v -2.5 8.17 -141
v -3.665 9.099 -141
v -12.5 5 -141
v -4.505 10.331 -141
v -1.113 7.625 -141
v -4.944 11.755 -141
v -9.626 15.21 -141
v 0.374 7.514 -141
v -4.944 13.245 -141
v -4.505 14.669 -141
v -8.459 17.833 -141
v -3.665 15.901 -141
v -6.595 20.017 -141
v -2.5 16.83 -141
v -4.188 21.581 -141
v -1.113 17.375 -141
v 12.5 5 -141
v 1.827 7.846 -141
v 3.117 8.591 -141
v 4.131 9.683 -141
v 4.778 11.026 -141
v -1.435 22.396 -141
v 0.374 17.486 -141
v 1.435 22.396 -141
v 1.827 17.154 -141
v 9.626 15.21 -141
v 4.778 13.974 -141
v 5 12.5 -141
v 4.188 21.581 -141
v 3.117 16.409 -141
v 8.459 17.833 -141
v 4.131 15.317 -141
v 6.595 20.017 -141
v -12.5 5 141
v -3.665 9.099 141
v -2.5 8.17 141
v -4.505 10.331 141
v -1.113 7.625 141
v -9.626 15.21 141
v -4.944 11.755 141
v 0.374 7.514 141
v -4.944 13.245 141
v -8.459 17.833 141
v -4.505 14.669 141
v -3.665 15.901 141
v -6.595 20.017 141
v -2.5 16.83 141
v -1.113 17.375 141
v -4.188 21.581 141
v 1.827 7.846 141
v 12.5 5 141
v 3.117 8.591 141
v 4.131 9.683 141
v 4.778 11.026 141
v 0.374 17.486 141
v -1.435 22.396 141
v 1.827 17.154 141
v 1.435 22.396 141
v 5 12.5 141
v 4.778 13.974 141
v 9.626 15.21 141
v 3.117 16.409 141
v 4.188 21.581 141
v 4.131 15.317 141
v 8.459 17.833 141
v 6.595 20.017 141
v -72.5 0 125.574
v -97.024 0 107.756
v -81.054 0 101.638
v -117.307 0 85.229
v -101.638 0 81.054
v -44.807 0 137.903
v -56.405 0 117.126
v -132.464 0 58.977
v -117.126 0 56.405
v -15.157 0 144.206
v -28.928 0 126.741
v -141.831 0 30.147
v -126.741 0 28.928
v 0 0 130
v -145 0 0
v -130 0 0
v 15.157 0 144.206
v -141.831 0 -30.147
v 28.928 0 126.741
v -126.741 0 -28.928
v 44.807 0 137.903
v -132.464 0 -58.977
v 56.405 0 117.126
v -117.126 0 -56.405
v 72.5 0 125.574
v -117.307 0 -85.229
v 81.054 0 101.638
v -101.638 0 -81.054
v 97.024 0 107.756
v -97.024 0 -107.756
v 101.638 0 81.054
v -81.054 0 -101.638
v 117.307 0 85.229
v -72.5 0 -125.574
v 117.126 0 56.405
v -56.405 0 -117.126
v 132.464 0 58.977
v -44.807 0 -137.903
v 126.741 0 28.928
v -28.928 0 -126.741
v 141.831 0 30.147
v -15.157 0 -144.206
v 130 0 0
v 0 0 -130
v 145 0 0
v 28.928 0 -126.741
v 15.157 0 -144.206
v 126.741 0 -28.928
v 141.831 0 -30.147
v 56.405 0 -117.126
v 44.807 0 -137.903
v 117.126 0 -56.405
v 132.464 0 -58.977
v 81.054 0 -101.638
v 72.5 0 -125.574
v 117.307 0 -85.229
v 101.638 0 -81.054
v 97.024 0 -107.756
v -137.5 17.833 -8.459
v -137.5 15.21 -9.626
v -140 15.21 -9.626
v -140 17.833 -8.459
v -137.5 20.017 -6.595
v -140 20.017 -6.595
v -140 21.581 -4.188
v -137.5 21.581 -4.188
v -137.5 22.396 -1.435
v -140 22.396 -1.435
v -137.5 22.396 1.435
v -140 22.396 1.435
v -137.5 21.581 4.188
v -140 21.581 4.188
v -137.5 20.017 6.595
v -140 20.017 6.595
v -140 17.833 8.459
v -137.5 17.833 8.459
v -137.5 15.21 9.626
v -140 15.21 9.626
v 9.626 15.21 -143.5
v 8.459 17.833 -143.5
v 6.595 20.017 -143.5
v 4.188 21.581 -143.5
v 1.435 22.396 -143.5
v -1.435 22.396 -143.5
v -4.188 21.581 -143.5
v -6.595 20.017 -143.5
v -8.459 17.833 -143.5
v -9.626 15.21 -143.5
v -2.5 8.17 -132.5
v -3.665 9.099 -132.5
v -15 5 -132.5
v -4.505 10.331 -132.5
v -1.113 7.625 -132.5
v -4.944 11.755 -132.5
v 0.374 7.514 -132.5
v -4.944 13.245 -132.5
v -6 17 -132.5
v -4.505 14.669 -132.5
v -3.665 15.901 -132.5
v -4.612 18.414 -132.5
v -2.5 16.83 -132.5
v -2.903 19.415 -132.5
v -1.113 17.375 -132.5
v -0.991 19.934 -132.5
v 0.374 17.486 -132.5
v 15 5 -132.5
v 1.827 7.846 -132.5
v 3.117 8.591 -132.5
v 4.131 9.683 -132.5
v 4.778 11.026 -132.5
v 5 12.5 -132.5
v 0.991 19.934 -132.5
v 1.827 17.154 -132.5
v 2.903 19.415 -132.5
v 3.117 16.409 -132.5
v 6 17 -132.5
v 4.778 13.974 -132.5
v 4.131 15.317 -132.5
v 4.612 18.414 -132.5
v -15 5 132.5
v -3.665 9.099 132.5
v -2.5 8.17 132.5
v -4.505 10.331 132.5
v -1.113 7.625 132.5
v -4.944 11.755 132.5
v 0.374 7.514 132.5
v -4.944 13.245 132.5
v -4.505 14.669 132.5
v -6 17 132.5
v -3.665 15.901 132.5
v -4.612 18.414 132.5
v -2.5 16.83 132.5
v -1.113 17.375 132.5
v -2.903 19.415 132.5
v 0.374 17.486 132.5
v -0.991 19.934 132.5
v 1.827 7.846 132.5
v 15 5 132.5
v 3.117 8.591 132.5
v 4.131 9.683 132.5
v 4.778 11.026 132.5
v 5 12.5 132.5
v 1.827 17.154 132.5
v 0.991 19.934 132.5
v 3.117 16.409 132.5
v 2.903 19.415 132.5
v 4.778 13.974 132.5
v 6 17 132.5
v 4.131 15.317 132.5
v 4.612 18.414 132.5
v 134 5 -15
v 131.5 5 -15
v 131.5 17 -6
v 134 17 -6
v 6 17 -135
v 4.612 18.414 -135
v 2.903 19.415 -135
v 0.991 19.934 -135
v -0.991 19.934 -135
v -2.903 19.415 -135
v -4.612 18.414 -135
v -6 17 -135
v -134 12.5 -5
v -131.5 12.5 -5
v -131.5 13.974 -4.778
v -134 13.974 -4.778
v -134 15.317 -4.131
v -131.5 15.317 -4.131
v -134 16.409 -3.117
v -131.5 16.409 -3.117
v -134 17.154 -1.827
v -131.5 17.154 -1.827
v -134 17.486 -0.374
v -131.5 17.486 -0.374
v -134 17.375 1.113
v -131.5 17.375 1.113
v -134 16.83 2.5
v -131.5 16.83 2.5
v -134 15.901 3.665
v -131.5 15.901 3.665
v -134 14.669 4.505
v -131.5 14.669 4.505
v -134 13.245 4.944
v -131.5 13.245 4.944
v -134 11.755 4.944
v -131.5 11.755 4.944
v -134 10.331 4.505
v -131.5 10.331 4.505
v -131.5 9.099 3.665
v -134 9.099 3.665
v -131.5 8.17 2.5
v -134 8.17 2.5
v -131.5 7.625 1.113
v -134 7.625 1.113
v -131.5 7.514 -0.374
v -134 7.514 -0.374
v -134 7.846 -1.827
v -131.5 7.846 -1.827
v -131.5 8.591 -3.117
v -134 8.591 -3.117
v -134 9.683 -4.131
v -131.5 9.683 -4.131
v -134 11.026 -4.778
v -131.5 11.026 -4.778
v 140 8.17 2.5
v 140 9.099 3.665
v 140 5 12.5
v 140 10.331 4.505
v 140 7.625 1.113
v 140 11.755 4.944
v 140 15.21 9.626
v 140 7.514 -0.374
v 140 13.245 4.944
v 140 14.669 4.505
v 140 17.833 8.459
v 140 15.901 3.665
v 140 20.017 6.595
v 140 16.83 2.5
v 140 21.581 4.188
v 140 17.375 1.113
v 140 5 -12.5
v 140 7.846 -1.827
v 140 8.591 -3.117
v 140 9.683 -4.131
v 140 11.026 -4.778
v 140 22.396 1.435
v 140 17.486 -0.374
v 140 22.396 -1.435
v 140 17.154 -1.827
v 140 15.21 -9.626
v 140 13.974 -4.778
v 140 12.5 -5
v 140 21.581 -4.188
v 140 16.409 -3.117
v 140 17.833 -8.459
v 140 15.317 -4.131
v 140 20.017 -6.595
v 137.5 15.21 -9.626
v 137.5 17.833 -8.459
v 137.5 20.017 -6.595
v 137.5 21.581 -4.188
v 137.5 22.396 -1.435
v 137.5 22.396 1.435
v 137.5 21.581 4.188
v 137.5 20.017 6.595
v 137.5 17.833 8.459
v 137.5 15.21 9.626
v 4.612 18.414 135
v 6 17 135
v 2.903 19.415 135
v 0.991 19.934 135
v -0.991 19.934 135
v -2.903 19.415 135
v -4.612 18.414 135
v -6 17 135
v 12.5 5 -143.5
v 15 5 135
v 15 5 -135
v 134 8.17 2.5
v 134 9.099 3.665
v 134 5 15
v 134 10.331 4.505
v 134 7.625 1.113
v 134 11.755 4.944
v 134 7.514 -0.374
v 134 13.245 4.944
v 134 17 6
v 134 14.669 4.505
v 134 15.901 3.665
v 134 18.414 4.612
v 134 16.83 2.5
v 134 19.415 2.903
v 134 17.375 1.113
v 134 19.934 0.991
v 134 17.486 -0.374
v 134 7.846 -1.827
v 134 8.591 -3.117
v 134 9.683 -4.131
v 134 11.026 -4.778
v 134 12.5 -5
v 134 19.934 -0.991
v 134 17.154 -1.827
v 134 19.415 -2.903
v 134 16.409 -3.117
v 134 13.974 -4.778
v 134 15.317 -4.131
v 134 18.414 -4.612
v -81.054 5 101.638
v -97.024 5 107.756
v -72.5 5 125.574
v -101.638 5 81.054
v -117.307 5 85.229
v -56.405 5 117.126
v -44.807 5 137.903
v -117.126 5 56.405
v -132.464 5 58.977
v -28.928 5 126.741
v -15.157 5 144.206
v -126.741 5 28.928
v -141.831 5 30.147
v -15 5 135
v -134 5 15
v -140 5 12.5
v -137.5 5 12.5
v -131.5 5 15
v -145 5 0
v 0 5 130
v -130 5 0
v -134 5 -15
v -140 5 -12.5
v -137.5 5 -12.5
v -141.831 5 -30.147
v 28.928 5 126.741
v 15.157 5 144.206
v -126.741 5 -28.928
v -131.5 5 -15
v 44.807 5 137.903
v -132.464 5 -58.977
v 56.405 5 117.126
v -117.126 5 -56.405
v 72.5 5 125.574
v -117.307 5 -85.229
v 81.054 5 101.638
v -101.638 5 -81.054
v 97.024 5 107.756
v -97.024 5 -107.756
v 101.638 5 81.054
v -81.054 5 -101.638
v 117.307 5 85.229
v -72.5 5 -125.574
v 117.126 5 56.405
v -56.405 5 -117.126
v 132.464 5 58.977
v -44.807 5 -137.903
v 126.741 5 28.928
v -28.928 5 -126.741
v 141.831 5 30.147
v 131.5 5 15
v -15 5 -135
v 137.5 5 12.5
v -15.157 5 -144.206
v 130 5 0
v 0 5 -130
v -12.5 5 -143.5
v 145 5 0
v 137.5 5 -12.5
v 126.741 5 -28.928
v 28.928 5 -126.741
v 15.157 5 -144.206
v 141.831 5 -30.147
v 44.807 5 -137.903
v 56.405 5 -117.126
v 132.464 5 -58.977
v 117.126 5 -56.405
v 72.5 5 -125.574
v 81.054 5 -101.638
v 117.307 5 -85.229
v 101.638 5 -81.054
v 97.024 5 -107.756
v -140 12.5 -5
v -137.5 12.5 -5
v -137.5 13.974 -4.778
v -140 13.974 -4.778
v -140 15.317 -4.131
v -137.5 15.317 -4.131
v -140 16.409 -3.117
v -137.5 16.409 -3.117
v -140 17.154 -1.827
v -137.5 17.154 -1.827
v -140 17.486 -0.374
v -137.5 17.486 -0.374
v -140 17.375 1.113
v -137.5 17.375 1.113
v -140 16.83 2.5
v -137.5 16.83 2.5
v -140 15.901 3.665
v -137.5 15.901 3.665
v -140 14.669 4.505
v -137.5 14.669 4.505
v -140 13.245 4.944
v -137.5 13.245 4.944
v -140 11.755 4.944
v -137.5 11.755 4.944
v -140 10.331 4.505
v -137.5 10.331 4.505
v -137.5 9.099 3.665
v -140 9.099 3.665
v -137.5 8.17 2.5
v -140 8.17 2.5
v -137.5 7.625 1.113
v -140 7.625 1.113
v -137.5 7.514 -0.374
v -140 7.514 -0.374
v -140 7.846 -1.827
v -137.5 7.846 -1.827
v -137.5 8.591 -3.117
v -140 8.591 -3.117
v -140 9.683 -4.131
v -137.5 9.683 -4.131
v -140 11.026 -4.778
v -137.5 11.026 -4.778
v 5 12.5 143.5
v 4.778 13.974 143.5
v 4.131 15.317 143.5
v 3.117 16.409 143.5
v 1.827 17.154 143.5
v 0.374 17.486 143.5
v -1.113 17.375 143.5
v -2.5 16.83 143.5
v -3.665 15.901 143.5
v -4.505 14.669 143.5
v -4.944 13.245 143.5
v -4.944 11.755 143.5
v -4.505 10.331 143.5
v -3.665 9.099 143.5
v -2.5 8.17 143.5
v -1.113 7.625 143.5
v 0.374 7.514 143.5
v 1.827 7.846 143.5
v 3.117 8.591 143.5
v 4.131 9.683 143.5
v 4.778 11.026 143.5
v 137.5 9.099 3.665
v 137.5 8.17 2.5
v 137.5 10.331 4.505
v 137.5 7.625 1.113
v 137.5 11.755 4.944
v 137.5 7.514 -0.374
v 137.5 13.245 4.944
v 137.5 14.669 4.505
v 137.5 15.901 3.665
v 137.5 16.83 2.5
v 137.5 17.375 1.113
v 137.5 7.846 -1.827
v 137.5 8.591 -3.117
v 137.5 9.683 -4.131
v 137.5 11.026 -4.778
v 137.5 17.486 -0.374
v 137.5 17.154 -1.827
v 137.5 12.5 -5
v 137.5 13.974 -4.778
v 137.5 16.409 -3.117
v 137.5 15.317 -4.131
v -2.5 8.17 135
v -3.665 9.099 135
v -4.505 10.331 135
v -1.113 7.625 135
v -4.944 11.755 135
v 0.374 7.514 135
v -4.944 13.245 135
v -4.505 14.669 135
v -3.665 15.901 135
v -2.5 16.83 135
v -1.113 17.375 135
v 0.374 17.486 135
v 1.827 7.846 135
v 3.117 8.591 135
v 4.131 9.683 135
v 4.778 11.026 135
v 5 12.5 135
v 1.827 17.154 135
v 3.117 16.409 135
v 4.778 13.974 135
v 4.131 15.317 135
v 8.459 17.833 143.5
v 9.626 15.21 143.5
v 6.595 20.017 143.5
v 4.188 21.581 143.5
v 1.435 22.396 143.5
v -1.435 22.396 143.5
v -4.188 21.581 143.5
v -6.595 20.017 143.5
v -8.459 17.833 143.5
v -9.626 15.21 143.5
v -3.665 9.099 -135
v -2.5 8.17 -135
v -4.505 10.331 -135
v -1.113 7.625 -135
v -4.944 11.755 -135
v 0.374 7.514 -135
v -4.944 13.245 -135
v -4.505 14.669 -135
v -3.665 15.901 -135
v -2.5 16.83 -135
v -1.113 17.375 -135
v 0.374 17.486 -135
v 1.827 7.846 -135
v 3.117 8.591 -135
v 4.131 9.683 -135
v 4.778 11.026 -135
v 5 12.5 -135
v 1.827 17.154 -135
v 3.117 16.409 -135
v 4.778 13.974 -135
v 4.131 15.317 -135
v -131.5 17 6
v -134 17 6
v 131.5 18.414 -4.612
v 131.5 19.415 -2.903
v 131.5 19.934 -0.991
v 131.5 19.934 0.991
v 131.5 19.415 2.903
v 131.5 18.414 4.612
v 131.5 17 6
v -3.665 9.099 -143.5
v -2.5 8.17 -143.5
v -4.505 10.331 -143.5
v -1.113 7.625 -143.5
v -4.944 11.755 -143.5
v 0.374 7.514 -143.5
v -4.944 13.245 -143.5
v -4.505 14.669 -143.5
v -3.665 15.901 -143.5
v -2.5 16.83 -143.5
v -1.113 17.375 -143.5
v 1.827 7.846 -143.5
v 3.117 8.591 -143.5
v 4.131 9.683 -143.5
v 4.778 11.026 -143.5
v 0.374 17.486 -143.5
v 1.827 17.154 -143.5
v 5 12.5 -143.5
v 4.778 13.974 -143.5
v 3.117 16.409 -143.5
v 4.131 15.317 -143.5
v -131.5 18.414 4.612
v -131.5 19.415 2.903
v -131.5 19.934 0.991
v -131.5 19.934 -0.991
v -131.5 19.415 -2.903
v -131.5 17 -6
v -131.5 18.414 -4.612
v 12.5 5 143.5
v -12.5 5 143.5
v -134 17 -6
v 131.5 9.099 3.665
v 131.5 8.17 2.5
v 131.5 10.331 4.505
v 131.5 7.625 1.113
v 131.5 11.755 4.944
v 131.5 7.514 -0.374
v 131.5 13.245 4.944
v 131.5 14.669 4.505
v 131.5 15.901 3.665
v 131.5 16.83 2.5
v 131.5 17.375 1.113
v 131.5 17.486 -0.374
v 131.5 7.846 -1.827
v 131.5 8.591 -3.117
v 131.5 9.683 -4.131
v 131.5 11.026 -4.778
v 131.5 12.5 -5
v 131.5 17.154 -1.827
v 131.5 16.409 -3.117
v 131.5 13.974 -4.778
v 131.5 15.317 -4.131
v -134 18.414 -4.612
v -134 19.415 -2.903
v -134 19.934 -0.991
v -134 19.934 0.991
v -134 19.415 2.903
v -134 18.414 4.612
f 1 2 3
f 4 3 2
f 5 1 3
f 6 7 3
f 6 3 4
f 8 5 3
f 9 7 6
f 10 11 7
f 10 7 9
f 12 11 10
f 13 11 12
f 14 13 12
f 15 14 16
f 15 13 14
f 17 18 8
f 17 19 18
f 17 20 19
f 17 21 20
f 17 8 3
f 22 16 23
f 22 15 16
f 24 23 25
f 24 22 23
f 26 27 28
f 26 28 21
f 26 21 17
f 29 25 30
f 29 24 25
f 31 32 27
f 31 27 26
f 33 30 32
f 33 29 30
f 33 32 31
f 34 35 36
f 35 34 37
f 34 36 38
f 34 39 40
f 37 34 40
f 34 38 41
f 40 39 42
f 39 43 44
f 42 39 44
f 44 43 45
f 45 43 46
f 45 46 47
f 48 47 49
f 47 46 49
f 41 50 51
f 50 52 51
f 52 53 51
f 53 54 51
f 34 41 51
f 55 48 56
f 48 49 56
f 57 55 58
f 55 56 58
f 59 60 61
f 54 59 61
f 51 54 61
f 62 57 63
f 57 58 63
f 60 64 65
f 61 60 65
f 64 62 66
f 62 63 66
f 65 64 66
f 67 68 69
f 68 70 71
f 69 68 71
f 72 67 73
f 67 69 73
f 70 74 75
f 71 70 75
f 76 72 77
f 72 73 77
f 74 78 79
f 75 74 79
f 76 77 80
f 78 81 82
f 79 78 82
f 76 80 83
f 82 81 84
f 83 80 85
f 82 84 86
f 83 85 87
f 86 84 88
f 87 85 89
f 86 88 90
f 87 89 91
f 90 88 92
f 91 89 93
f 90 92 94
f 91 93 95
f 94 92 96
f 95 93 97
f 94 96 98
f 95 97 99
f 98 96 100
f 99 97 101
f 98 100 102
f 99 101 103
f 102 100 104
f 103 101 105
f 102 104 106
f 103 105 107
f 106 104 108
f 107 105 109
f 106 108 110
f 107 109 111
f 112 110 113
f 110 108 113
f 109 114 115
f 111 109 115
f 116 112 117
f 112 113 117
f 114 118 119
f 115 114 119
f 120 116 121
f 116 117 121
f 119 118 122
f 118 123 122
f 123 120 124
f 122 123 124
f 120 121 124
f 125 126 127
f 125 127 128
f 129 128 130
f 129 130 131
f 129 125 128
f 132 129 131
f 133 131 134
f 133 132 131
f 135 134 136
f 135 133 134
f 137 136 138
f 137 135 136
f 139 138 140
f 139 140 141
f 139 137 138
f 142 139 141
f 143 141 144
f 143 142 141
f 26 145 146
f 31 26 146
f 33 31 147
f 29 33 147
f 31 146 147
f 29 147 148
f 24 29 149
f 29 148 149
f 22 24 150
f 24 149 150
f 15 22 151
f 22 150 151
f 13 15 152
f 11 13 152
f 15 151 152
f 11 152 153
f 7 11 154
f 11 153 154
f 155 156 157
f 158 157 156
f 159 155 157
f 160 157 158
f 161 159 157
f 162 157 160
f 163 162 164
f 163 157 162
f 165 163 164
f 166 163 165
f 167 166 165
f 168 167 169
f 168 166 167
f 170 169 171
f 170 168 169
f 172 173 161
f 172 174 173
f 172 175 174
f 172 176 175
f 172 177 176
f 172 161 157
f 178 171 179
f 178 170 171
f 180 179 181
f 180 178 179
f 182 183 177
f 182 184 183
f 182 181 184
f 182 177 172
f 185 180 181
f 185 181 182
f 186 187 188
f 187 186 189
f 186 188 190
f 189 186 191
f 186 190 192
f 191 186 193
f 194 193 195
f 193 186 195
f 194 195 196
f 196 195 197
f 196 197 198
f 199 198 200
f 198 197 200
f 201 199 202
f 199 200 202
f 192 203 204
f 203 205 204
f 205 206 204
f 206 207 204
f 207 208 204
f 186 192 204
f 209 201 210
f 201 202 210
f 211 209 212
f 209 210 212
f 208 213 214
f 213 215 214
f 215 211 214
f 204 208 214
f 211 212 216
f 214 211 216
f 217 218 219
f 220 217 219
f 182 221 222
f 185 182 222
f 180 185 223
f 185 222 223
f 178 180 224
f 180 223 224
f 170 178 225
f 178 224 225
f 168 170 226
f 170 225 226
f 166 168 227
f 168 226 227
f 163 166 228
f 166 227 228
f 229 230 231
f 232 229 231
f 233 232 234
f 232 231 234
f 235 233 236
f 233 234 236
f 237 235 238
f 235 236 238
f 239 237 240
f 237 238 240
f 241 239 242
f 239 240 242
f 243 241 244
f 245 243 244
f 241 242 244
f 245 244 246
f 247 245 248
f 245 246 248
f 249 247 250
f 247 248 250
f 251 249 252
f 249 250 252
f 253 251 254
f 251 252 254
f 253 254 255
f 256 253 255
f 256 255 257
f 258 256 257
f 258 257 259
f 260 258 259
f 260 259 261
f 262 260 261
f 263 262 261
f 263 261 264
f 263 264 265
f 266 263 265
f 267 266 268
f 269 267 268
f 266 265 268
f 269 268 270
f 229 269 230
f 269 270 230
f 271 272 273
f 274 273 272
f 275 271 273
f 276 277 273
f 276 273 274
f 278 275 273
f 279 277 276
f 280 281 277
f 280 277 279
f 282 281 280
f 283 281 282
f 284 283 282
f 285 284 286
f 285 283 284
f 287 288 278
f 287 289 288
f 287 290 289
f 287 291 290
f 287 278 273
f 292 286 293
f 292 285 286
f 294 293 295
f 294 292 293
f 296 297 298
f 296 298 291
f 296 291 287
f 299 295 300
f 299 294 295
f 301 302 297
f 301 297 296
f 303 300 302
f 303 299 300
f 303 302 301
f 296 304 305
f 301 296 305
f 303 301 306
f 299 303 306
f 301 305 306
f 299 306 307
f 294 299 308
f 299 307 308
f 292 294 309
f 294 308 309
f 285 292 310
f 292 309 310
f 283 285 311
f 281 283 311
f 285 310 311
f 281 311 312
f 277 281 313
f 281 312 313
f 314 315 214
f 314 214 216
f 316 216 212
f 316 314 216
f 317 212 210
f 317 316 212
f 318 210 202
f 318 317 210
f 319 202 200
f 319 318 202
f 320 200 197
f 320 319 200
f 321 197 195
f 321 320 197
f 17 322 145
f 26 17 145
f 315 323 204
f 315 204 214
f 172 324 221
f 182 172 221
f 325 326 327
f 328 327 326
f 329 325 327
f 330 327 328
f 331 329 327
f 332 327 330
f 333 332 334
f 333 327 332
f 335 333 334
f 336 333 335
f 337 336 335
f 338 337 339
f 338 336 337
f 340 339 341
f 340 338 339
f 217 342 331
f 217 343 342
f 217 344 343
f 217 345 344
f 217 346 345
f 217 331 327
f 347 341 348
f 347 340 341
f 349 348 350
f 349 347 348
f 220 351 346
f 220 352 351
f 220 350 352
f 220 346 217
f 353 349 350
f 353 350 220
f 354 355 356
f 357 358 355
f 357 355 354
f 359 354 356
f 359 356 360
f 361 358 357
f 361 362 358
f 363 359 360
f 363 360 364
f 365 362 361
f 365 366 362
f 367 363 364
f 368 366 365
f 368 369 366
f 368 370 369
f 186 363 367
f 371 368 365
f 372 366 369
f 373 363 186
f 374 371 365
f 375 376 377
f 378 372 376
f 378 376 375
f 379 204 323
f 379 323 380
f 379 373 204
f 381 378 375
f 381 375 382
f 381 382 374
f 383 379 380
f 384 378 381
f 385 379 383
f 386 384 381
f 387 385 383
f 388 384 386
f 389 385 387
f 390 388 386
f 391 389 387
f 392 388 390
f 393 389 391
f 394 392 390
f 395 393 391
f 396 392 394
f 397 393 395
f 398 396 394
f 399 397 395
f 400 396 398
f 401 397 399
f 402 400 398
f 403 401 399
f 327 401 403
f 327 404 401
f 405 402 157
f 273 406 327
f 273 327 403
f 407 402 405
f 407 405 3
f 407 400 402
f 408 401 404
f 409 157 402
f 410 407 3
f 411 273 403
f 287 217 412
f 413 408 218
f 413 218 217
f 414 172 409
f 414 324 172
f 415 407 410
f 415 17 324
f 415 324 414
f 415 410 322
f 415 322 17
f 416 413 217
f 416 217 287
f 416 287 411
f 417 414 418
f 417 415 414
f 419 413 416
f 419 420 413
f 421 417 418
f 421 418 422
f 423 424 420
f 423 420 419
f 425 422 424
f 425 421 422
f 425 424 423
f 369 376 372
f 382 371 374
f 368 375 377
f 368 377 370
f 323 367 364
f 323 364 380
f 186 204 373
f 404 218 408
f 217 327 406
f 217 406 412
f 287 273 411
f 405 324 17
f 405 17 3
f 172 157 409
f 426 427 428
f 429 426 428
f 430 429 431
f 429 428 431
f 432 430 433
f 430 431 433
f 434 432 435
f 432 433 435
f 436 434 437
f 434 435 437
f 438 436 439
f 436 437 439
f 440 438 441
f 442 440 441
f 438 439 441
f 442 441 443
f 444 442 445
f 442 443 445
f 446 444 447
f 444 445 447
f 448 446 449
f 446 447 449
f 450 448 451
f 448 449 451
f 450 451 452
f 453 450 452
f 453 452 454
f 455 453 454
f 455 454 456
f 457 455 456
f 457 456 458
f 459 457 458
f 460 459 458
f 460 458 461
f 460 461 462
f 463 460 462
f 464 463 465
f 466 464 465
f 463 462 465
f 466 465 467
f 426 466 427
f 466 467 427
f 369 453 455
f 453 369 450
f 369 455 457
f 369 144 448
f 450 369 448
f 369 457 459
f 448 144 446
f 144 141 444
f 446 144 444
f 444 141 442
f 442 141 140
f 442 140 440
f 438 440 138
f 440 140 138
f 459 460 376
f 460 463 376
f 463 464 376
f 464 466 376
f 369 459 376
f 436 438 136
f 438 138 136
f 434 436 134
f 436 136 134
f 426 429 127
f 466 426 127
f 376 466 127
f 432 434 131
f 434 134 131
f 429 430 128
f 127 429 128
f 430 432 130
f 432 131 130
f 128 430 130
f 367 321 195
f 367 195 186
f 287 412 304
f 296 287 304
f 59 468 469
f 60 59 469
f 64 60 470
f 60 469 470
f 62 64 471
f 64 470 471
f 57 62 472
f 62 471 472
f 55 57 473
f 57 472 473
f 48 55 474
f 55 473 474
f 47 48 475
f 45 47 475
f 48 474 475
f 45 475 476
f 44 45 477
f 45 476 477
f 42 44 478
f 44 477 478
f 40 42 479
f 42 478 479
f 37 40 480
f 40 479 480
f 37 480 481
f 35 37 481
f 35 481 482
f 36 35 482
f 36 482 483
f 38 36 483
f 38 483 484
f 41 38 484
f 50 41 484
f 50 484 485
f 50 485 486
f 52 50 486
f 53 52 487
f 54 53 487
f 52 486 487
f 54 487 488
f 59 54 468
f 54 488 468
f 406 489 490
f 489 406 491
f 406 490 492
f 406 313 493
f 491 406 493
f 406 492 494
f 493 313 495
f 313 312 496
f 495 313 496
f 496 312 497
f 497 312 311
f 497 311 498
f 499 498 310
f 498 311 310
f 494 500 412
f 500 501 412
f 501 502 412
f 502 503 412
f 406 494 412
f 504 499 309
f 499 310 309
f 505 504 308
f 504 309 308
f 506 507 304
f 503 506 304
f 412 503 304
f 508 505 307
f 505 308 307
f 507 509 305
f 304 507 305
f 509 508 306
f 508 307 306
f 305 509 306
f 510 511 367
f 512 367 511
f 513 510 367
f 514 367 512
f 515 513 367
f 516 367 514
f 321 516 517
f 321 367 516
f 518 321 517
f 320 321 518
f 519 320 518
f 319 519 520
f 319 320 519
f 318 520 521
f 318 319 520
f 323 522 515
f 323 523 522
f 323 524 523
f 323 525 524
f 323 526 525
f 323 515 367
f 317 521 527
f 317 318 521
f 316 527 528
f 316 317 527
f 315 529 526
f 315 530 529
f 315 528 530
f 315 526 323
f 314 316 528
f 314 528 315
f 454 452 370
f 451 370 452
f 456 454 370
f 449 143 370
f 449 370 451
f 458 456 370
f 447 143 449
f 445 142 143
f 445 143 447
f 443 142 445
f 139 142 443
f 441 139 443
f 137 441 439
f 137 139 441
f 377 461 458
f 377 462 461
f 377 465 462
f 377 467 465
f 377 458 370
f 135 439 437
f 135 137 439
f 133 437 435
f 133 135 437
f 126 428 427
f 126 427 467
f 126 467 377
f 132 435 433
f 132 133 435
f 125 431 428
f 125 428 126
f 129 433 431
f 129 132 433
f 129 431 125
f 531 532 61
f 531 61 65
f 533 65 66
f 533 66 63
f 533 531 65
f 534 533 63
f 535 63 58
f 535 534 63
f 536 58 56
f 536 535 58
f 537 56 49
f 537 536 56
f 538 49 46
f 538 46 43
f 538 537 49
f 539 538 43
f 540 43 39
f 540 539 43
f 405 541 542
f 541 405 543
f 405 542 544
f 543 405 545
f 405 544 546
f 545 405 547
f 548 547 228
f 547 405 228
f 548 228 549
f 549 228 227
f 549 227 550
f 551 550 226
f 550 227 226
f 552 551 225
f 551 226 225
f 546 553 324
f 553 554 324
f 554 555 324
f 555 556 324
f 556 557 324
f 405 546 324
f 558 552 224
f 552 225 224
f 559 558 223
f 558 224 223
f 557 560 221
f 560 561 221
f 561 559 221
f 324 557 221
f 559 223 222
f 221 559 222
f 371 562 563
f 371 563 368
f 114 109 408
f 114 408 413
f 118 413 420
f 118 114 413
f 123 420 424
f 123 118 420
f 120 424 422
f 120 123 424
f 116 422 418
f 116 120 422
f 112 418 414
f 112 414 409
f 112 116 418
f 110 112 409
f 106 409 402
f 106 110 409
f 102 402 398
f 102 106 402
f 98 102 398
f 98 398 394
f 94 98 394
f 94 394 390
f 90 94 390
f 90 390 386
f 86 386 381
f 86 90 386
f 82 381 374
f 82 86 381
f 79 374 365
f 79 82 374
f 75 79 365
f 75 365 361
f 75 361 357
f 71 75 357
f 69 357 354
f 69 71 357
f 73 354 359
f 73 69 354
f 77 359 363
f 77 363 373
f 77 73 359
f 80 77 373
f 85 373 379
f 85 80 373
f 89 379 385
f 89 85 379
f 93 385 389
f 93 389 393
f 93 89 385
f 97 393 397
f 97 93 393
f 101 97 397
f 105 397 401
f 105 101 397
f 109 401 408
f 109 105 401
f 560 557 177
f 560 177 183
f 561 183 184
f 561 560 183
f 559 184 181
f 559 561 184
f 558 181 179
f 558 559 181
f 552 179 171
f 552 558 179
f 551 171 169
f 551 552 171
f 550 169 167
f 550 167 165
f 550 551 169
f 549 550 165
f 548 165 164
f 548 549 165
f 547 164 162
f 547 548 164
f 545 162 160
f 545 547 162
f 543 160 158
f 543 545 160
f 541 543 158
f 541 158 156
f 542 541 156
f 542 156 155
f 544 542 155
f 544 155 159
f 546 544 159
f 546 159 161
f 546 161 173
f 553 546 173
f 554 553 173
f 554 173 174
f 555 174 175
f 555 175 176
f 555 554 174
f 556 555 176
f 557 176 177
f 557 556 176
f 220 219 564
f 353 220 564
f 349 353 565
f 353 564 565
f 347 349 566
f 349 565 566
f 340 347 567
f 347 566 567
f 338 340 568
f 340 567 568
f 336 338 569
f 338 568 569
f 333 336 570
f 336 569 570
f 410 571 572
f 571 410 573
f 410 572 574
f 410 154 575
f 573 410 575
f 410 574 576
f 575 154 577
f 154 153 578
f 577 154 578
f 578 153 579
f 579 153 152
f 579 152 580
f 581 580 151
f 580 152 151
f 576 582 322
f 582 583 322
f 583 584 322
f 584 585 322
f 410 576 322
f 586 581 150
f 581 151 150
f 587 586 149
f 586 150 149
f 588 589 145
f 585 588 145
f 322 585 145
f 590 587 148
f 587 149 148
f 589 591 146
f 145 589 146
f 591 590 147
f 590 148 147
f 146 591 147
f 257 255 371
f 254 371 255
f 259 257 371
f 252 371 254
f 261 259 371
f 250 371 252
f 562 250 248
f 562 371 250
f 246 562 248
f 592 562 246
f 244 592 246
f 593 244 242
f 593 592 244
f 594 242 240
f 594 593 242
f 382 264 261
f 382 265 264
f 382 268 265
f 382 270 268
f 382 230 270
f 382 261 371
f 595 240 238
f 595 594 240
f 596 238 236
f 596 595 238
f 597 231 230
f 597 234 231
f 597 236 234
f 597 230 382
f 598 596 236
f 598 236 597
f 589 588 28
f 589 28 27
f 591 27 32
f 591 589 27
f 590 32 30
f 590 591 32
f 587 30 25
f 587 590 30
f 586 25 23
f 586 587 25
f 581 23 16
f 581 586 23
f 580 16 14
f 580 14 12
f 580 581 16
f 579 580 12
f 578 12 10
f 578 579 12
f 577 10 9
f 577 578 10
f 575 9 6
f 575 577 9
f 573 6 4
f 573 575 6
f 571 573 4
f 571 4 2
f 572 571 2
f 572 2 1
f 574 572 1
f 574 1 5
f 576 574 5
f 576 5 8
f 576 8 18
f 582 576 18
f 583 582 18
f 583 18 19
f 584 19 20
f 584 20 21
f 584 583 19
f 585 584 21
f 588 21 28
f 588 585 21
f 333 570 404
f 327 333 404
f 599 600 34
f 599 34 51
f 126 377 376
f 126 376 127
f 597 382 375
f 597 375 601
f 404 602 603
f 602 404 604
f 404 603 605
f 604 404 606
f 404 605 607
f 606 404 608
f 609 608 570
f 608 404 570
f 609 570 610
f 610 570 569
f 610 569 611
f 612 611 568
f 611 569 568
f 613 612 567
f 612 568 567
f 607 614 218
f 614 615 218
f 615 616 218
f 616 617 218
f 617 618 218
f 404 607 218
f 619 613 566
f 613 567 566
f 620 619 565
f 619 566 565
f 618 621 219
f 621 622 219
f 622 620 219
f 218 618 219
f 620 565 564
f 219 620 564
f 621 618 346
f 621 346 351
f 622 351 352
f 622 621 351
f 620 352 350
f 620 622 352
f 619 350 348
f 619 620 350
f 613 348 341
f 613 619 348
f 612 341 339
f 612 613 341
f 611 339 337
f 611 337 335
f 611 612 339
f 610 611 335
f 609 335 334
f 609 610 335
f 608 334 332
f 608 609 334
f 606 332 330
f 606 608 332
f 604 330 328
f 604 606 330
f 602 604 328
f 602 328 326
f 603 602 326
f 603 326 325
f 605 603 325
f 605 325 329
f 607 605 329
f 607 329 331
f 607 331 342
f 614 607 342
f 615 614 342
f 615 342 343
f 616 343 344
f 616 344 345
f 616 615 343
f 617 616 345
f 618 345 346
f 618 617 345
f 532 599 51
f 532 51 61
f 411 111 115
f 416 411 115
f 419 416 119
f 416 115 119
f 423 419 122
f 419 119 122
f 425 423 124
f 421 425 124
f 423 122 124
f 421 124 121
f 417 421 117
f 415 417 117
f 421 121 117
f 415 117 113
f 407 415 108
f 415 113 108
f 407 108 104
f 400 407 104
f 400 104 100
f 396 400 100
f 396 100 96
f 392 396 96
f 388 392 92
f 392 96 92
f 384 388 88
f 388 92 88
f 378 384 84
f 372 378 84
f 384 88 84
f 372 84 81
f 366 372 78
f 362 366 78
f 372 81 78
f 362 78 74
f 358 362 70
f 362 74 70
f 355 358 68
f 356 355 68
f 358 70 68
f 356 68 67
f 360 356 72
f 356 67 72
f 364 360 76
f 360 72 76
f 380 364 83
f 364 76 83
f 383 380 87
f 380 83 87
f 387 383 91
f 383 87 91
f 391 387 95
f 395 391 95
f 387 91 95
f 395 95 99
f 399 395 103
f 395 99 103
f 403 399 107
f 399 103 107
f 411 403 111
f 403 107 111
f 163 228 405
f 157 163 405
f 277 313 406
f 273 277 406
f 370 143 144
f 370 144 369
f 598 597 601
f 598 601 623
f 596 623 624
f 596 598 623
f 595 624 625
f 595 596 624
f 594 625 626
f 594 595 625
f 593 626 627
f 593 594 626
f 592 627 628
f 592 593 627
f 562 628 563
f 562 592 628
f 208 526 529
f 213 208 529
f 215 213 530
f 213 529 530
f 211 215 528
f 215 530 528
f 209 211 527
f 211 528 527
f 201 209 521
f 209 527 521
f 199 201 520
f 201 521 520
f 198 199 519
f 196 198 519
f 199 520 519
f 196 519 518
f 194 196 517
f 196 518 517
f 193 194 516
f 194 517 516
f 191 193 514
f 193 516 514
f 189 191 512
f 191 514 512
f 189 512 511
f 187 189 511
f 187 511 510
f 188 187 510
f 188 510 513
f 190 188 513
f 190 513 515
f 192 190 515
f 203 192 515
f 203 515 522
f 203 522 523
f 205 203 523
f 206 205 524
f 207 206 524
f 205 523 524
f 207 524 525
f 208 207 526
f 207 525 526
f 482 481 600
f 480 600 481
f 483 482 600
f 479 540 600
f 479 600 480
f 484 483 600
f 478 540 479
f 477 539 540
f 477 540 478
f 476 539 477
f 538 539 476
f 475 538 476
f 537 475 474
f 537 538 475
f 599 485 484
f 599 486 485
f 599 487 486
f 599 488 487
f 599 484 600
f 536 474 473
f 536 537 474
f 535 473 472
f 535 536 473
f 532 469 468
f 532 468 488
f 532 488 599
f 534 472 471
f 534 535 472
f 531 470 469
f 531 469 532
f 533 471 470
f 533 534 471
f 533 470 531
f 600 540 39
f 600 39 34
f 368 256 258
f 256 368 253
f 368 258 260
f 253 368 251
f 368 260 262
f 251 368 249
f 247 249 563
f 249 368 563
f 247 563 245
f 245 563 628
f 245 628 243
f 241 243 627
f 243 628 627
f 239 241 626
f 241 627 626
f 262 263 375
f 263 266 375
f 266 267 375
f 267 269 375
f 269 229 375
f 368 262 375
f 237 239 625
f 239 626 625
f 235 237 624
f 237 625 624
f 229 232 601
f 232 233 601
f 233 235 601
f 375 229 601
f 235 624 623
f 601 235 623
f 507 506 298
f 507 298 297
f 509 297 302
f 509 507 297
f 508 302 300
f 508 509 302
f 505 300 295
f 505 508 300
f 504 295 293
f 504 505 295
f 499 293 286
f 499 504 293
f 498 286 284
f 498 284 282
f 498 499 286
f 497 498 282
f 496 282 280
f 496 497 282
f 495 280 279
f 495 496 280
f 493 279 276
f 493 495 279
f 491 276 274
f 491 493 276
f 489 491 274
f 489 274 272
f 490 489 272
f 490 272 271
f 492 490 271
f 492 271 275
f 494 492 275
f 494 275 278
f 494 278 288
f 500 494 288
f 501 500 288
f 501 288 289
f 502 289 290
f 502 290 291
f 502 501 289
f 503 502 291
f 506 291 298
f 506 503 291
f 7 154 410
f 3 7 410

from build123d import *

# Parameters (mm, degrees)
SKETCH1_R           = 145
SKETCH1_R_2         = 130
BOSS_EXTRUDE1_DEPTH = 5
BOSS_EXTRUDE2_START = -10
SKETCH5_R           = 5
BOSS_EXTRUDE2_DEPTH = 2.5
BOSS_EXTRUDE3_START = -1.5
SKETCH6_R           = 5
BOSS_EXTRUDE3_DEPTH = 2.5
BOSS_EXTRUDE4_START = 137.5
SKETCH8_R           = 5
BOSS_EXTRUDE4_DEPTH = 2.5
BOSS_EXTRUDE5_START = 131.5
SKETCH10_R          = 5
BOSS_EXTRUDE5_DEPTH = 2.5


with BuildPart() as part:
    # Sketch1 → Boss-Extrude1 (new body)
    with BuildSketch(Plane(origin=(0, 0, 0), x_dir=(1, 0, 0), z_dir=(0, 1, 0))):
        Circle(SKETCH1_R)
        Circle(SKETCH1_R_2, mode=Mode.SUBTRACT)
    extrude(amount=BOSS_EXTRUDE1_DEPTH)

    # Sketch5 → Boss-Extrude2 (add)
    with BuildSketch(Plane.XY.offset(145).offset(BOSS_EXTRUDE2_START)):
        with BuildLine():
            Line((-15, 5), (15, 5))
            Line((15, 5), (6, 17))
            ThreePointArc((6, 17), (0, 20), (-6, 17))
            Line((-6, 17), (-15, 5))
        make_face()
        with Locations((0, 12.5)):
            Circle(SKETCH5_R, mode=Mode.SUBTRACT)
    boss_extrude2 = extrude(amount=-BOSS_EXTRUDE2_DEPTH)


with BuildPart() as body_2:
    # Sketch6 → Boss-Extrude3 (new body)
    with BuildSketch(Plane.XY.offset(145).offset(BOSS_EXTRUDE3_START)):
        with BuildLine():
            Line((-12.5, 5), (12.5, 5))
            Line((12.5, 5), (9.62585943, 15.209765716))
            ThreePointArc((9.62585943, 15.209765716), (0, 22.5), (-9.62585943, 15.209765716))
            Line((-9.62585943, 15.209765716), (-12.5, 5))
        make_face()
        with Locations((0, 12.5)):
            Circle(SKETCH6_R, mode=Mode.SUBTRACT)
    boss_extrude3 = extrude(amount=-BOSS_EXTRUDE3_DEPTH)


with BuildPart() as part_1:
    add(part.part)

    # Mirror1: Boss-Extrude2, Boss-Extrude3 across plane
    add(boss_extrude2.mirror(Plane.XY))
    add(boss_extrude3.mirror(Plane.XY))

    # Sketch8 → Boss-Extrude4 (add)
    with BuildSketch(Plane(origin=(0, 0, 0), x_dir=(0, 0, -1), z_dir=(1, 0, 0)).offset(BOSS_EXTRUDE4_START)):
        with BuildLine():
            Line((-12.5, 5), (12.5, 5))
            Line((12.5, 5), (9.62585943, 15.209765716))
            ThreePointArc((9.62585943, 15.209765716), (0, 22.5), (-9.62585943, 15.209765716))
            Line((-9.62585943, 15.209765716), (-12.5, 5))
        make_face()
        with Locations((0, 12.5)):
            Circle(SKETCH8_R, mode=Mode.SUBTRACT)
    boss_extrude4 = extrude(amount=BOSS_EXTRUDE4_DEPTH)

    # Sketch10 → Boss-Extrude5 (add)
    with BuildSketch(Plane(origin=(0, 0, 0), x_dir=(0, 0, -1), z_dir=(1, 0, 0)).offset(BOSS_EXTRUDE5_START)):
        with BuildLine():
            Line((-15, 5), (15, 5))
            Line((15, 5), (6, 17))
            ThreePointArc((6, 17), (0, 20), (-6, 17))
            Line((-6, 17), (-15, 5))
        make_face()
        with Locations((0, 12.5)):
            Circle(SKETCH10_R, mode=Mode.SUBTRACT)
    boss_extrude5 = extrude(amount=BOSS_EXTRUDE5_DEPTH)

    # Mirror2: Boss-Extrude4, Boss-Extrude5 across plane
    add(boss_extrude4.mirror(Plane(origin=(0, 0, 0), x_dir=(0, 0, 1), z_dir=(1, 0, 0))))
    add(boss_extrude5.mirror(Plane(origin=(0, 0, 0), x_dir=(0, 0, 1), z_dir=(1, 0, 0))))


solid = Compound([body_2.part, part_1.part])
